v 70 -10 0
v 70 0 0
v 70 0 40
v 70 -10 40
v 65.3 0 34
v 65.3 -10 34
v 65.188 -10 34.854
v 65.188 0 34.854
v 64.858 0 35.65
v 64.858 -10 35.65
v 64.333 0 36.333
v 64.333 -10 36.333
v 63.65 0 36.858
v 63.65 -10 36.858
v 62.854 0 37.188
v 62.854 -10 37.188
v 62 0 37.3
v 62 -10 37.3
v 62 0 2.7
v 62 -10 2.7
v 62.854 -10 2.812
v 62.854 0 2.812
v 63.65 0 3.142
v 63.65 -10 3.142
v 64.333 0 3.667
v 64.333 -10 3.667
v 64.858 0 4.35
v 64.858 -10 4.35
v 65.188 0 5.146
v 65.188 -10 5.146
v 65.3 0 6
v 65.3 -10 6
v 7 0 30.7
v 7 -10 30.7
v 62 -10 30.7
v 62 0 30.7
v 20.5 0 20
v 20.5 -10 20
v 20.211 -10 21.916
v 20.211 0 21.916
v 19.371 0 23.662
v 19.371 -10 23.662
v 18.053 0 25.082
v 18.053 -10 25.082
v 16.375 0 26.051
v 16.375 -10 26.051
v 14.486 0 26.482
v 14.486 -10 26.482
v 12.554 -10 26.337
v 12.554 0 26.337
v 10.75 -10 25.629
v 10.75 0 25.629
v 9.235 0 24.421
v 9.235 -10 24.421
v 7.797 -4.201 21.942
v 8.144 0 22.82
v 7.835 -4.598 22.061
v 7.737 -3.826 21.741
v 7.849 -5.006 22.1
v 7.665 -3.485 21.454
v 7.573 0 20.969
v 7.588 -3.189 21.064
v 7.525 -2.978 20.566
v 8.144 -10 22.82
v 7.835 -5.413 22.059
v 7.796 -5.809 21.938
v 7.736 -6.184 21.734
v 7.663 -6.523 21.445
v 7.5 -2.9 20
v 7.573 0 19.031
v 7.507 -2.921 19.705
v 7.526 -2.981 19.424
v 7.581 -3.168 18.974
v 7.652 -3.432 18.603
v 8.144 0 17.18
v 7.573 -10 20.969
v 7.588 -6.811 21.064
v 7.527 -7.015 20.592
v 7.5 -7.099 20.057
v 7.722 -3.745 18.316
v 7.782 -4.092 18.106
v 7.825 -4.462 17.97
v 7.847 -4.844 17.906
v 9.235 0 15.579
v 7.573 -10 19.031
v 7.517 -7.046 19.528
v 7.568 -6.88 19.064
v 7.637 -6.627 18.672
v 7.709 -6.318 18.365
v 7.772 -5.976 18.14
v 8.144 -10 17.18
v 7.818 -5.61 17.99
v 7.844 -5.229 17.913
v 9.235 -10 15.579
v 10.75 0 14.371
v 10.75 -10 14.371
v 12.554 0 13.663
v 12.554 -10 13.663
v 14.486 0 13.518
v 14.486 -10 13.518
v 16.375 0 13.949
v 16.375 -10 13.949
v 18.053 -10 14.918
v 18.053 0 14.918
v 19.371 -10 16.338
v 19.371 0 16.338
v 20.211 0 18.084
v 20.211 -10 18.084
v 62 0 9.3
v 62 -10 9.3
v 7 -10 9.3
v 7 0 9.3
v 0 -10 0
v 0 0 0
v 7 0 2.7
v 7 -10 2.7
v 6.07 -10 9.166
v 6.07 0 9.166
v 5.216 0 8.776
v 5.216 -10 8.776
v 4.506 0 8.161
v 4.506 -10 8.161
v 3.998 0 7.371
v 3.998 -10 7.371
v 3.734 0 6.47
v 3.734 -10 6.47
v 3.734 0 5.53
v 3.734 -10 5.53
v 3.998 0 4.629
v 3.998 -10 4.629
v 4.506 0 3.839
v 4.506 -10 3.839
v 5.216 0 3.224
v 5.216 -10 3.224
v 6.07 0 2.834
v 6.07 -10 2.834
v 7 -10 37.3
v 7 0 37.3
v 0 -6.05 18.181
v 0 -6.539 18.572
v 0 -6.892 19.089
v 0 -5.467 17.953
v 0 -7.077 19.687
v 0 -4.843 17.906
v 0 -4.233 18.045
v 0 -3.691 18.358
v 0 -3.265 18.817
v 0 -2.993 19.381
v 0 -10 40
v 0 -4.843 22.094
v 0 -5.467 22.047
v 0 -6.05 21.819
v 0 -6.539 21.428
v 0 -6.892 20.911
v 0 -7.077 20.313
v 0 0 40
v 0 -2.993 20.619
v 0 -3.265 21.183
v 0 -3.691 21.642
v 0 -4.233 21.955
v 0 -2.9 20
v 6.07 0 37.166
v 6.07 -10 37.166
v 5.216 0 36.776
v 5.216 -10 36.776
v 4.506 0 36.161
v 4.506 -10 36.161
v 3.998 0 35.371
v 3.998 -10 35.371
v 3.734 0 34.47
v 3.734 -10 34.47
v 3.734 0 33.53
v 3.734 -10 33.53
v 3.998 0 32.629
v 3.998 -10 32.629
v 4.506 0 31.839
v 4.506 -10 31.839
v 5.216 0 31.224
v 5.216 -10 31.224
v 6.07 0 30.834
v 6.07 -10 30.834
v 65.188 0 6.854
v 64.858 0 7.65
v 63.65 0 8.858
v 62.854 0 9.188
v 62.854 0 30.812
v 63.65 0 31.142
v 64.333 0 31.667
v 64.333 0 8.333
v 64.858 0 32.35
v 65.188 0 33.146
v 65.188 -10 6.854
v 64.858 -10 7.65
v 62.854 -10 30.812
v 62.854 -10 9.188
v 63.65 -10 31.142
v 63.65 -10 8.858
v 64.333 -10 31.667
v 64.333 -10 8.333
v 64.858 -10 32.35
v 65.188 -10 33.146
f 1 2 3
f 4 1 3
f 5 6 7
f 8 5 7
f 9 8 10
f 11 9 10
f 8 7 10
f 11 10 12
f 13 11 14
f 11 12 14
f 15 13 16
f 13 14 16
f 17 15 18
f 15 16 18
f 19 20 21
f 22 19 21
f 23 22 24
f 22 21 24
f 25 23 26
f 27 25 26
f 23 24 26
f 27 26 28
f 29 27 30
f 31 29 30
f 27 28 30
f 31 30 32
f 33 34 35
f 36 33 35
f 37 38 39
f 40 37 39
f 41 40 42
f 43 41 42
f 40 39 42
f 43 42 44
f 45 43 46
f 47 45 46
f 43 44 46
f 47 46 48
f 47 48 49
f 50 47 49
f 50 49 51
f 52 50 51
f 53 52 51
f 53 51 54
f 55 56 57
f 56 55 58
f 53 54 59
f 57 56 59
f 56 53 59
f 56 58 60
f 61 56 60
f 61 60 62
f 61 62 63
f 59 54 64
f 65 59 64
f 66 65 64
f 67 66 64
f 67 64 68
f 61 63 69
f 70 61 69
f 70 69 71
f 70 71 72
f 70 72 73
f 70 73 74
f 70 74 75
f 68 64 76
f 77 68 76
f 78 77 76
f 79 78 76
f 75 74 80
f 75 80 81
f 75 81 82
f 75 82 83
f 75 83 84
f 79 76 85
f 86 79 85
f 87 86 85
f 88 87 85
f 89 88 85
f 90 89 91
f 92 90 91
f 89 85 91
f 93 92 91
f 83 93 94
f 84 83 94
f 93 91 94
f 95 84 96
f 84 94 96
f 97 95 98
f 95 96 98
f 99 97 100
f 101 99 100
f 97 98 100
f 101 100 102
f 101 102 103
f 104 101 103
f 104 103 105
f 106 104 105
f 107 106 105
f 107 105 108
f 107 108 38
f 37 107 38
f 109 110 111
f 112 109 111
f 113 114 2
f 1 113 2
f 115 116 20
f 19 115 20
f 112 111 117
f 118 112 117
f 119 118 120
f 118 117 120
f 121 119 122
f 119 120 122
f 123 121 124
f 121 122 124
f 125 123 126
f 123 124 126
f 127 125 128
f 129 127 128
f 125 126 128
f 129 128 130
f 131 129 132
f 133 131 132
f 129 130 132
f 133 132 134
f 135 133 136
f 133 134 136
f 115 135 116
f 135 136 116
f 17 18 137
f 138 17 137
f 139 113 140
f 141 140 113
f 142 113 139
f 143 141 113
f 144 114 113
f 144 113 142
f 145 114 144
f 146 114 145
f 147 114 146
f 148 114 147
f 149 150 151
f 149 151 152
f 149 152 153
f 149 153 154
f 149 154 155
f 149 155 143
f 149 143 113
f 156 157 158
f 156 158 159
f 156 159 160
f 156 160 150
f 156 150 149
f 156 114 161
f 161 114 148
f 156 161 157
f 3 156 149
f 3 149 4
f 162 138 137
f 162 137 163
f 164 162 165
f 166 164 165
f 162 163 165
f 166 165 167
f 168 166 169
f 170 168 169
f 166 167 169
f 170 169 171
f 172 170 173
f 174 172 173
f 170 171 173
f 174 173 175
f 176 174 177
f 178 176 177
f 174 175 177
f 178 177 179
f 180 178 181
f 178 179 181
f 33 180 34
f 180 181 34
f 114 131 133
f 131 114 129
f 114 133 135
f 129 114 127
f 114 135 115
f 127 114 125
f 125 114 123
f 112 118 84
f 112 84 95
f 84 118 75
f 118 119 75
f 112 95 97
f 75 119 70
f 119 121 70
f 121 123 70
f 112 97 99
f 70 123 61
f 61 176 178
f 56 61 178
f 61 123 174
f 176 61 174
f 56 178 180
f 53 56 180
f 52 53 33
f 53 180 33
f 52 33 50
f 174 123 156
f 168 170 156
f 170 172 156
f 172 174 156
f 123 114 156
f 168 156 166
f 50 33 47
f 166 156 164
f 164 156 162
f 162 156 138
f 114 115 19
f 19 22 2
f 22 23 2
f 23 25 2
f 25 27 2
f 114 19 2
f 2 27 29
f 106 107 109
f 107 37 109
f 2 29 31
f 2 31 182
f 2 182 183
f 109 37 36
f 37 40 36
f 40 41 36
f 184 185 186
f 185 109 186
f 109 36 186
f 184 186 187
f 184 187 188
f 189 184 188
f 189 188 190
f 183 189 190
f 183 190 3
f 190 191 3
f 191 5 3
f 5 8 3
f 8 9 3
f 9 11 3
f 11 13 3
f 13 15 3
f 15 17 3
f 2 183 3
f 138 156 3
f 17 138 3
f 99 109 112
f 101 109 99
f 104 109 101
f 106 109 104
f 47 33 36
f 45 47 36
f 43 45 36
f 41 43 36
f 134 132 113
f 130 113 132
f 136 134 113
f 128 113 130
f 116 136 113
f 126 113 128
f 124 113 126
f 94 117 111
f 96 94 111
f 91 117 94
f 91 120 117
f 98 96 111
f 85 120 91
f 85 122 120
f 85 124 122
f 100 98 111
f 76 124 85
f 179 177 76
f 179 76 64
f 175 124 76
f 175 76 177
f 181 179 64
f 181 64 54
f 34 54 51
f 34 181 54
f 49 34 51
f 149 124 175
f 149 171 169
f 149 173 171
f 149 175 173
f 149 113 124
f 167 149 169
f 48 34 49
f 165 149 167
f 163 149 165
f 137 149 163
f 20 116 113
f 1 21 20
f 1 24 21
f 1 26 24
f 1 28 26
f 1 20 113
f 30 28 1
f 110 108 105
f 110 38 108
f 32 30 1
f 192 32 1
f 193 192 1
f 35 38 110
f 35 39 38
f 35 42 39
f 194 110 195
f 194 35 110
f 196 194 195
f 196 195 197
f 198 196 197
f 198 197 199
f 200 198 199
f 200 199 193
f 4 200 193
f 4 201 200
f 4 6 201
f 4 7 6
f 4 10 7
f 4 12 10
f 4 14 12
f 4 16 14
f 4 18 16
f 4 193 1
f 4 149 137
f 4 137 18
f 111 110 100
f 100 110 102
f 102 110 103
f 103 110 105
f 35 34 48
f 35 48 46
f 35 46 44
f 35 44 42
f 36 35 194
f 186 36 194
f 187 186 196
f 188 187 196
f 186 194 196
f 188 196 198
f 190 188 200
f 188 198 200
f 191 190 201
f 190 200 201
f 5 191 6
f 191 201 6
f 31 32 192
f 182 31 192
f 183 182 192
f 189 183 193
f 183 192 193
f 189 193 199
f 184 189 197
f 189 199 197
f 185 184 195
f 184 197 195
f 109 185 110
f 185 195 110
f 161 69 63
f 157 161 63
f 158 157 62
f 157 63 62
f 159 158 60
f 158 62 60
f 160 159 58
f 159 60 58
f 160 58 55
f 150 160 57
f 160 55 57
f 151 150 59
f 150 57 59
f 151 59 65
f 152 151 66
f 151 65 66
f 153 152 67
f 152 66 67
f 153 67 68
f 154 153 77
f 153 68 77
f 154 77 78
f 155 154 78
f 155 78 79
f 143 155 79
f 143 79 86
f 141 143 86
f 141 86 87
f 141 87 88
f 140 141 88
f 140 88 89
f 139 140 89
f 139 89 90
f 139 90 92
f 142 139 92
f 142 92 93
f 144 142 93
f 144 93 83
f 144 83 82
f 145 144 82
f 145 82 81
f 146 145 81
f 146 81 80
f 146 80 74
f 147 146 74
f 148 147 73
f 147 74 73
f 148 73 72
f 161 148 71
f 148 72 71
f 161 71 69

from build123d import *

# Parameters (mm, degrees)
F0_W     = 70
F0_H     = 40
F1_DEPTH = 10
F2_R     = 6.5
F3_DEPTH = 25
F5_D     = 4.2
F5_DEPTH = 15
F5_TIP   = 1.2618073


with BuildPart() as f1:
    # F0 (on Front) → F1 (new body)
    with BuildSketch(Plane.XZ):
        with Locations((35, 20)):
            Rectangle(F0_W, F0_H)
    extrude(amount=F1_DEPTH)

    # F2 (on face) → F3 (cut)
    with BuildSketch(Plane.XZ.offset(10)):
        with BuildLine():
            Line((62, 30.7), (62, 37.3))
            ThreePointArc((62, 37.3), (58.7, 34), (62, 30.7))
        make_face()
        with BuildLine():
            ThreePointArc((62, 30.7), (64.3334523779, 31.6665476221), (65.3, 34))
            ThreePointArc((65.3, 34), (64.3334523779, 36.3334523779), (62, 37.3))
            Line((62, 37.3), (62, 30.7))
        make_face()
        with BuildLine():
            ThreePointArc((10.3, 34), (9.3334523779, 36.3334523779), (7, 37.3))
            ThreePointArc((7, 37.3), (3.7, 34), (7, 30.7))
            ThreePointArc((7, 30.7), (9.3334523779, 31.6665476221), (10.3, 34))
        make_face()
        with BuildLine():
            ThreePointArc((7, 2.7), (9.3334523779, 3.6665476221), (10.3, 6))
            ThreePointArc((10.3, 6), (9.3334523779, 8.3334523779), (7, 9.3))
            ThreePointArc((7, 9.3), (3.7, 6), (7, 2.7))
        make_face()
        with BuildLine():
            Line((62, 2.7), (62, 9.3))
            ThreePointArc((62, 9.3), (58.7, 6), (62, 2.7))
        make_face()
        with BuildLine():
            ThreePointArc((65.3, 6), (64.3334523779, 8.3334523779), (62, 9.3))
            Line((62, 9.3), (62, 2.7))
            ThreePointArc((62, 2.7), (64.3334523779, 3.6665476221), (65.3, 6))
        make_face()
        with BuildLine():
            ThreePointArc((62, 30.7), (58.7, 34), (62, 37.3))
            Line((62, 37.3), (7, 37.3))
            ThreePointArc((7, 37.3), (9.3334523779, 36.3334523779), (10.3, 34))
            ThreePointArc((10.3, 34), (9.3334523779, 31.6665476221), (7, 30.7))
            Line((7, 30.7), (62, 30.7))
        make_face()
        with BuildLine():
            ThreePointArc((7, 9.3), (9.3334523779, 8.3334523779), (10.3, 6))
            ThreePointArc((10.3, 6), (9.3334523779, 3.6665476221), (7, 2.7))
            Line((7, 2.7), (62, 2.7))
            ThreePointArc((62, 2.7), (58.7, 6), (62, 9.3))
            Line((62, 9.3), (7, 9.3))
        make_face()
        with Locations((14, 20)):
            Circle(F2_R)
    extrude(amount=-F3_DEPTH, mode=Mode.SUBTRACT)

    # F5
    with Locations(Plane(origin=(0, 0, 0), x_dir=(0, -1, 0), z_dir=(-1, 0, 0))):
        with Locations((5, 20)):
            Hole(F5_D / 2, depth=F5_DEPTH)
            with Locations((0, 0, -(F5_DEPTH + F5_TIP / 2))):  # 118° drill point
                Cone(0, F5_D / 2, F5_TIP, mode=Mode.SUBTRACT)


solid = f1.part
